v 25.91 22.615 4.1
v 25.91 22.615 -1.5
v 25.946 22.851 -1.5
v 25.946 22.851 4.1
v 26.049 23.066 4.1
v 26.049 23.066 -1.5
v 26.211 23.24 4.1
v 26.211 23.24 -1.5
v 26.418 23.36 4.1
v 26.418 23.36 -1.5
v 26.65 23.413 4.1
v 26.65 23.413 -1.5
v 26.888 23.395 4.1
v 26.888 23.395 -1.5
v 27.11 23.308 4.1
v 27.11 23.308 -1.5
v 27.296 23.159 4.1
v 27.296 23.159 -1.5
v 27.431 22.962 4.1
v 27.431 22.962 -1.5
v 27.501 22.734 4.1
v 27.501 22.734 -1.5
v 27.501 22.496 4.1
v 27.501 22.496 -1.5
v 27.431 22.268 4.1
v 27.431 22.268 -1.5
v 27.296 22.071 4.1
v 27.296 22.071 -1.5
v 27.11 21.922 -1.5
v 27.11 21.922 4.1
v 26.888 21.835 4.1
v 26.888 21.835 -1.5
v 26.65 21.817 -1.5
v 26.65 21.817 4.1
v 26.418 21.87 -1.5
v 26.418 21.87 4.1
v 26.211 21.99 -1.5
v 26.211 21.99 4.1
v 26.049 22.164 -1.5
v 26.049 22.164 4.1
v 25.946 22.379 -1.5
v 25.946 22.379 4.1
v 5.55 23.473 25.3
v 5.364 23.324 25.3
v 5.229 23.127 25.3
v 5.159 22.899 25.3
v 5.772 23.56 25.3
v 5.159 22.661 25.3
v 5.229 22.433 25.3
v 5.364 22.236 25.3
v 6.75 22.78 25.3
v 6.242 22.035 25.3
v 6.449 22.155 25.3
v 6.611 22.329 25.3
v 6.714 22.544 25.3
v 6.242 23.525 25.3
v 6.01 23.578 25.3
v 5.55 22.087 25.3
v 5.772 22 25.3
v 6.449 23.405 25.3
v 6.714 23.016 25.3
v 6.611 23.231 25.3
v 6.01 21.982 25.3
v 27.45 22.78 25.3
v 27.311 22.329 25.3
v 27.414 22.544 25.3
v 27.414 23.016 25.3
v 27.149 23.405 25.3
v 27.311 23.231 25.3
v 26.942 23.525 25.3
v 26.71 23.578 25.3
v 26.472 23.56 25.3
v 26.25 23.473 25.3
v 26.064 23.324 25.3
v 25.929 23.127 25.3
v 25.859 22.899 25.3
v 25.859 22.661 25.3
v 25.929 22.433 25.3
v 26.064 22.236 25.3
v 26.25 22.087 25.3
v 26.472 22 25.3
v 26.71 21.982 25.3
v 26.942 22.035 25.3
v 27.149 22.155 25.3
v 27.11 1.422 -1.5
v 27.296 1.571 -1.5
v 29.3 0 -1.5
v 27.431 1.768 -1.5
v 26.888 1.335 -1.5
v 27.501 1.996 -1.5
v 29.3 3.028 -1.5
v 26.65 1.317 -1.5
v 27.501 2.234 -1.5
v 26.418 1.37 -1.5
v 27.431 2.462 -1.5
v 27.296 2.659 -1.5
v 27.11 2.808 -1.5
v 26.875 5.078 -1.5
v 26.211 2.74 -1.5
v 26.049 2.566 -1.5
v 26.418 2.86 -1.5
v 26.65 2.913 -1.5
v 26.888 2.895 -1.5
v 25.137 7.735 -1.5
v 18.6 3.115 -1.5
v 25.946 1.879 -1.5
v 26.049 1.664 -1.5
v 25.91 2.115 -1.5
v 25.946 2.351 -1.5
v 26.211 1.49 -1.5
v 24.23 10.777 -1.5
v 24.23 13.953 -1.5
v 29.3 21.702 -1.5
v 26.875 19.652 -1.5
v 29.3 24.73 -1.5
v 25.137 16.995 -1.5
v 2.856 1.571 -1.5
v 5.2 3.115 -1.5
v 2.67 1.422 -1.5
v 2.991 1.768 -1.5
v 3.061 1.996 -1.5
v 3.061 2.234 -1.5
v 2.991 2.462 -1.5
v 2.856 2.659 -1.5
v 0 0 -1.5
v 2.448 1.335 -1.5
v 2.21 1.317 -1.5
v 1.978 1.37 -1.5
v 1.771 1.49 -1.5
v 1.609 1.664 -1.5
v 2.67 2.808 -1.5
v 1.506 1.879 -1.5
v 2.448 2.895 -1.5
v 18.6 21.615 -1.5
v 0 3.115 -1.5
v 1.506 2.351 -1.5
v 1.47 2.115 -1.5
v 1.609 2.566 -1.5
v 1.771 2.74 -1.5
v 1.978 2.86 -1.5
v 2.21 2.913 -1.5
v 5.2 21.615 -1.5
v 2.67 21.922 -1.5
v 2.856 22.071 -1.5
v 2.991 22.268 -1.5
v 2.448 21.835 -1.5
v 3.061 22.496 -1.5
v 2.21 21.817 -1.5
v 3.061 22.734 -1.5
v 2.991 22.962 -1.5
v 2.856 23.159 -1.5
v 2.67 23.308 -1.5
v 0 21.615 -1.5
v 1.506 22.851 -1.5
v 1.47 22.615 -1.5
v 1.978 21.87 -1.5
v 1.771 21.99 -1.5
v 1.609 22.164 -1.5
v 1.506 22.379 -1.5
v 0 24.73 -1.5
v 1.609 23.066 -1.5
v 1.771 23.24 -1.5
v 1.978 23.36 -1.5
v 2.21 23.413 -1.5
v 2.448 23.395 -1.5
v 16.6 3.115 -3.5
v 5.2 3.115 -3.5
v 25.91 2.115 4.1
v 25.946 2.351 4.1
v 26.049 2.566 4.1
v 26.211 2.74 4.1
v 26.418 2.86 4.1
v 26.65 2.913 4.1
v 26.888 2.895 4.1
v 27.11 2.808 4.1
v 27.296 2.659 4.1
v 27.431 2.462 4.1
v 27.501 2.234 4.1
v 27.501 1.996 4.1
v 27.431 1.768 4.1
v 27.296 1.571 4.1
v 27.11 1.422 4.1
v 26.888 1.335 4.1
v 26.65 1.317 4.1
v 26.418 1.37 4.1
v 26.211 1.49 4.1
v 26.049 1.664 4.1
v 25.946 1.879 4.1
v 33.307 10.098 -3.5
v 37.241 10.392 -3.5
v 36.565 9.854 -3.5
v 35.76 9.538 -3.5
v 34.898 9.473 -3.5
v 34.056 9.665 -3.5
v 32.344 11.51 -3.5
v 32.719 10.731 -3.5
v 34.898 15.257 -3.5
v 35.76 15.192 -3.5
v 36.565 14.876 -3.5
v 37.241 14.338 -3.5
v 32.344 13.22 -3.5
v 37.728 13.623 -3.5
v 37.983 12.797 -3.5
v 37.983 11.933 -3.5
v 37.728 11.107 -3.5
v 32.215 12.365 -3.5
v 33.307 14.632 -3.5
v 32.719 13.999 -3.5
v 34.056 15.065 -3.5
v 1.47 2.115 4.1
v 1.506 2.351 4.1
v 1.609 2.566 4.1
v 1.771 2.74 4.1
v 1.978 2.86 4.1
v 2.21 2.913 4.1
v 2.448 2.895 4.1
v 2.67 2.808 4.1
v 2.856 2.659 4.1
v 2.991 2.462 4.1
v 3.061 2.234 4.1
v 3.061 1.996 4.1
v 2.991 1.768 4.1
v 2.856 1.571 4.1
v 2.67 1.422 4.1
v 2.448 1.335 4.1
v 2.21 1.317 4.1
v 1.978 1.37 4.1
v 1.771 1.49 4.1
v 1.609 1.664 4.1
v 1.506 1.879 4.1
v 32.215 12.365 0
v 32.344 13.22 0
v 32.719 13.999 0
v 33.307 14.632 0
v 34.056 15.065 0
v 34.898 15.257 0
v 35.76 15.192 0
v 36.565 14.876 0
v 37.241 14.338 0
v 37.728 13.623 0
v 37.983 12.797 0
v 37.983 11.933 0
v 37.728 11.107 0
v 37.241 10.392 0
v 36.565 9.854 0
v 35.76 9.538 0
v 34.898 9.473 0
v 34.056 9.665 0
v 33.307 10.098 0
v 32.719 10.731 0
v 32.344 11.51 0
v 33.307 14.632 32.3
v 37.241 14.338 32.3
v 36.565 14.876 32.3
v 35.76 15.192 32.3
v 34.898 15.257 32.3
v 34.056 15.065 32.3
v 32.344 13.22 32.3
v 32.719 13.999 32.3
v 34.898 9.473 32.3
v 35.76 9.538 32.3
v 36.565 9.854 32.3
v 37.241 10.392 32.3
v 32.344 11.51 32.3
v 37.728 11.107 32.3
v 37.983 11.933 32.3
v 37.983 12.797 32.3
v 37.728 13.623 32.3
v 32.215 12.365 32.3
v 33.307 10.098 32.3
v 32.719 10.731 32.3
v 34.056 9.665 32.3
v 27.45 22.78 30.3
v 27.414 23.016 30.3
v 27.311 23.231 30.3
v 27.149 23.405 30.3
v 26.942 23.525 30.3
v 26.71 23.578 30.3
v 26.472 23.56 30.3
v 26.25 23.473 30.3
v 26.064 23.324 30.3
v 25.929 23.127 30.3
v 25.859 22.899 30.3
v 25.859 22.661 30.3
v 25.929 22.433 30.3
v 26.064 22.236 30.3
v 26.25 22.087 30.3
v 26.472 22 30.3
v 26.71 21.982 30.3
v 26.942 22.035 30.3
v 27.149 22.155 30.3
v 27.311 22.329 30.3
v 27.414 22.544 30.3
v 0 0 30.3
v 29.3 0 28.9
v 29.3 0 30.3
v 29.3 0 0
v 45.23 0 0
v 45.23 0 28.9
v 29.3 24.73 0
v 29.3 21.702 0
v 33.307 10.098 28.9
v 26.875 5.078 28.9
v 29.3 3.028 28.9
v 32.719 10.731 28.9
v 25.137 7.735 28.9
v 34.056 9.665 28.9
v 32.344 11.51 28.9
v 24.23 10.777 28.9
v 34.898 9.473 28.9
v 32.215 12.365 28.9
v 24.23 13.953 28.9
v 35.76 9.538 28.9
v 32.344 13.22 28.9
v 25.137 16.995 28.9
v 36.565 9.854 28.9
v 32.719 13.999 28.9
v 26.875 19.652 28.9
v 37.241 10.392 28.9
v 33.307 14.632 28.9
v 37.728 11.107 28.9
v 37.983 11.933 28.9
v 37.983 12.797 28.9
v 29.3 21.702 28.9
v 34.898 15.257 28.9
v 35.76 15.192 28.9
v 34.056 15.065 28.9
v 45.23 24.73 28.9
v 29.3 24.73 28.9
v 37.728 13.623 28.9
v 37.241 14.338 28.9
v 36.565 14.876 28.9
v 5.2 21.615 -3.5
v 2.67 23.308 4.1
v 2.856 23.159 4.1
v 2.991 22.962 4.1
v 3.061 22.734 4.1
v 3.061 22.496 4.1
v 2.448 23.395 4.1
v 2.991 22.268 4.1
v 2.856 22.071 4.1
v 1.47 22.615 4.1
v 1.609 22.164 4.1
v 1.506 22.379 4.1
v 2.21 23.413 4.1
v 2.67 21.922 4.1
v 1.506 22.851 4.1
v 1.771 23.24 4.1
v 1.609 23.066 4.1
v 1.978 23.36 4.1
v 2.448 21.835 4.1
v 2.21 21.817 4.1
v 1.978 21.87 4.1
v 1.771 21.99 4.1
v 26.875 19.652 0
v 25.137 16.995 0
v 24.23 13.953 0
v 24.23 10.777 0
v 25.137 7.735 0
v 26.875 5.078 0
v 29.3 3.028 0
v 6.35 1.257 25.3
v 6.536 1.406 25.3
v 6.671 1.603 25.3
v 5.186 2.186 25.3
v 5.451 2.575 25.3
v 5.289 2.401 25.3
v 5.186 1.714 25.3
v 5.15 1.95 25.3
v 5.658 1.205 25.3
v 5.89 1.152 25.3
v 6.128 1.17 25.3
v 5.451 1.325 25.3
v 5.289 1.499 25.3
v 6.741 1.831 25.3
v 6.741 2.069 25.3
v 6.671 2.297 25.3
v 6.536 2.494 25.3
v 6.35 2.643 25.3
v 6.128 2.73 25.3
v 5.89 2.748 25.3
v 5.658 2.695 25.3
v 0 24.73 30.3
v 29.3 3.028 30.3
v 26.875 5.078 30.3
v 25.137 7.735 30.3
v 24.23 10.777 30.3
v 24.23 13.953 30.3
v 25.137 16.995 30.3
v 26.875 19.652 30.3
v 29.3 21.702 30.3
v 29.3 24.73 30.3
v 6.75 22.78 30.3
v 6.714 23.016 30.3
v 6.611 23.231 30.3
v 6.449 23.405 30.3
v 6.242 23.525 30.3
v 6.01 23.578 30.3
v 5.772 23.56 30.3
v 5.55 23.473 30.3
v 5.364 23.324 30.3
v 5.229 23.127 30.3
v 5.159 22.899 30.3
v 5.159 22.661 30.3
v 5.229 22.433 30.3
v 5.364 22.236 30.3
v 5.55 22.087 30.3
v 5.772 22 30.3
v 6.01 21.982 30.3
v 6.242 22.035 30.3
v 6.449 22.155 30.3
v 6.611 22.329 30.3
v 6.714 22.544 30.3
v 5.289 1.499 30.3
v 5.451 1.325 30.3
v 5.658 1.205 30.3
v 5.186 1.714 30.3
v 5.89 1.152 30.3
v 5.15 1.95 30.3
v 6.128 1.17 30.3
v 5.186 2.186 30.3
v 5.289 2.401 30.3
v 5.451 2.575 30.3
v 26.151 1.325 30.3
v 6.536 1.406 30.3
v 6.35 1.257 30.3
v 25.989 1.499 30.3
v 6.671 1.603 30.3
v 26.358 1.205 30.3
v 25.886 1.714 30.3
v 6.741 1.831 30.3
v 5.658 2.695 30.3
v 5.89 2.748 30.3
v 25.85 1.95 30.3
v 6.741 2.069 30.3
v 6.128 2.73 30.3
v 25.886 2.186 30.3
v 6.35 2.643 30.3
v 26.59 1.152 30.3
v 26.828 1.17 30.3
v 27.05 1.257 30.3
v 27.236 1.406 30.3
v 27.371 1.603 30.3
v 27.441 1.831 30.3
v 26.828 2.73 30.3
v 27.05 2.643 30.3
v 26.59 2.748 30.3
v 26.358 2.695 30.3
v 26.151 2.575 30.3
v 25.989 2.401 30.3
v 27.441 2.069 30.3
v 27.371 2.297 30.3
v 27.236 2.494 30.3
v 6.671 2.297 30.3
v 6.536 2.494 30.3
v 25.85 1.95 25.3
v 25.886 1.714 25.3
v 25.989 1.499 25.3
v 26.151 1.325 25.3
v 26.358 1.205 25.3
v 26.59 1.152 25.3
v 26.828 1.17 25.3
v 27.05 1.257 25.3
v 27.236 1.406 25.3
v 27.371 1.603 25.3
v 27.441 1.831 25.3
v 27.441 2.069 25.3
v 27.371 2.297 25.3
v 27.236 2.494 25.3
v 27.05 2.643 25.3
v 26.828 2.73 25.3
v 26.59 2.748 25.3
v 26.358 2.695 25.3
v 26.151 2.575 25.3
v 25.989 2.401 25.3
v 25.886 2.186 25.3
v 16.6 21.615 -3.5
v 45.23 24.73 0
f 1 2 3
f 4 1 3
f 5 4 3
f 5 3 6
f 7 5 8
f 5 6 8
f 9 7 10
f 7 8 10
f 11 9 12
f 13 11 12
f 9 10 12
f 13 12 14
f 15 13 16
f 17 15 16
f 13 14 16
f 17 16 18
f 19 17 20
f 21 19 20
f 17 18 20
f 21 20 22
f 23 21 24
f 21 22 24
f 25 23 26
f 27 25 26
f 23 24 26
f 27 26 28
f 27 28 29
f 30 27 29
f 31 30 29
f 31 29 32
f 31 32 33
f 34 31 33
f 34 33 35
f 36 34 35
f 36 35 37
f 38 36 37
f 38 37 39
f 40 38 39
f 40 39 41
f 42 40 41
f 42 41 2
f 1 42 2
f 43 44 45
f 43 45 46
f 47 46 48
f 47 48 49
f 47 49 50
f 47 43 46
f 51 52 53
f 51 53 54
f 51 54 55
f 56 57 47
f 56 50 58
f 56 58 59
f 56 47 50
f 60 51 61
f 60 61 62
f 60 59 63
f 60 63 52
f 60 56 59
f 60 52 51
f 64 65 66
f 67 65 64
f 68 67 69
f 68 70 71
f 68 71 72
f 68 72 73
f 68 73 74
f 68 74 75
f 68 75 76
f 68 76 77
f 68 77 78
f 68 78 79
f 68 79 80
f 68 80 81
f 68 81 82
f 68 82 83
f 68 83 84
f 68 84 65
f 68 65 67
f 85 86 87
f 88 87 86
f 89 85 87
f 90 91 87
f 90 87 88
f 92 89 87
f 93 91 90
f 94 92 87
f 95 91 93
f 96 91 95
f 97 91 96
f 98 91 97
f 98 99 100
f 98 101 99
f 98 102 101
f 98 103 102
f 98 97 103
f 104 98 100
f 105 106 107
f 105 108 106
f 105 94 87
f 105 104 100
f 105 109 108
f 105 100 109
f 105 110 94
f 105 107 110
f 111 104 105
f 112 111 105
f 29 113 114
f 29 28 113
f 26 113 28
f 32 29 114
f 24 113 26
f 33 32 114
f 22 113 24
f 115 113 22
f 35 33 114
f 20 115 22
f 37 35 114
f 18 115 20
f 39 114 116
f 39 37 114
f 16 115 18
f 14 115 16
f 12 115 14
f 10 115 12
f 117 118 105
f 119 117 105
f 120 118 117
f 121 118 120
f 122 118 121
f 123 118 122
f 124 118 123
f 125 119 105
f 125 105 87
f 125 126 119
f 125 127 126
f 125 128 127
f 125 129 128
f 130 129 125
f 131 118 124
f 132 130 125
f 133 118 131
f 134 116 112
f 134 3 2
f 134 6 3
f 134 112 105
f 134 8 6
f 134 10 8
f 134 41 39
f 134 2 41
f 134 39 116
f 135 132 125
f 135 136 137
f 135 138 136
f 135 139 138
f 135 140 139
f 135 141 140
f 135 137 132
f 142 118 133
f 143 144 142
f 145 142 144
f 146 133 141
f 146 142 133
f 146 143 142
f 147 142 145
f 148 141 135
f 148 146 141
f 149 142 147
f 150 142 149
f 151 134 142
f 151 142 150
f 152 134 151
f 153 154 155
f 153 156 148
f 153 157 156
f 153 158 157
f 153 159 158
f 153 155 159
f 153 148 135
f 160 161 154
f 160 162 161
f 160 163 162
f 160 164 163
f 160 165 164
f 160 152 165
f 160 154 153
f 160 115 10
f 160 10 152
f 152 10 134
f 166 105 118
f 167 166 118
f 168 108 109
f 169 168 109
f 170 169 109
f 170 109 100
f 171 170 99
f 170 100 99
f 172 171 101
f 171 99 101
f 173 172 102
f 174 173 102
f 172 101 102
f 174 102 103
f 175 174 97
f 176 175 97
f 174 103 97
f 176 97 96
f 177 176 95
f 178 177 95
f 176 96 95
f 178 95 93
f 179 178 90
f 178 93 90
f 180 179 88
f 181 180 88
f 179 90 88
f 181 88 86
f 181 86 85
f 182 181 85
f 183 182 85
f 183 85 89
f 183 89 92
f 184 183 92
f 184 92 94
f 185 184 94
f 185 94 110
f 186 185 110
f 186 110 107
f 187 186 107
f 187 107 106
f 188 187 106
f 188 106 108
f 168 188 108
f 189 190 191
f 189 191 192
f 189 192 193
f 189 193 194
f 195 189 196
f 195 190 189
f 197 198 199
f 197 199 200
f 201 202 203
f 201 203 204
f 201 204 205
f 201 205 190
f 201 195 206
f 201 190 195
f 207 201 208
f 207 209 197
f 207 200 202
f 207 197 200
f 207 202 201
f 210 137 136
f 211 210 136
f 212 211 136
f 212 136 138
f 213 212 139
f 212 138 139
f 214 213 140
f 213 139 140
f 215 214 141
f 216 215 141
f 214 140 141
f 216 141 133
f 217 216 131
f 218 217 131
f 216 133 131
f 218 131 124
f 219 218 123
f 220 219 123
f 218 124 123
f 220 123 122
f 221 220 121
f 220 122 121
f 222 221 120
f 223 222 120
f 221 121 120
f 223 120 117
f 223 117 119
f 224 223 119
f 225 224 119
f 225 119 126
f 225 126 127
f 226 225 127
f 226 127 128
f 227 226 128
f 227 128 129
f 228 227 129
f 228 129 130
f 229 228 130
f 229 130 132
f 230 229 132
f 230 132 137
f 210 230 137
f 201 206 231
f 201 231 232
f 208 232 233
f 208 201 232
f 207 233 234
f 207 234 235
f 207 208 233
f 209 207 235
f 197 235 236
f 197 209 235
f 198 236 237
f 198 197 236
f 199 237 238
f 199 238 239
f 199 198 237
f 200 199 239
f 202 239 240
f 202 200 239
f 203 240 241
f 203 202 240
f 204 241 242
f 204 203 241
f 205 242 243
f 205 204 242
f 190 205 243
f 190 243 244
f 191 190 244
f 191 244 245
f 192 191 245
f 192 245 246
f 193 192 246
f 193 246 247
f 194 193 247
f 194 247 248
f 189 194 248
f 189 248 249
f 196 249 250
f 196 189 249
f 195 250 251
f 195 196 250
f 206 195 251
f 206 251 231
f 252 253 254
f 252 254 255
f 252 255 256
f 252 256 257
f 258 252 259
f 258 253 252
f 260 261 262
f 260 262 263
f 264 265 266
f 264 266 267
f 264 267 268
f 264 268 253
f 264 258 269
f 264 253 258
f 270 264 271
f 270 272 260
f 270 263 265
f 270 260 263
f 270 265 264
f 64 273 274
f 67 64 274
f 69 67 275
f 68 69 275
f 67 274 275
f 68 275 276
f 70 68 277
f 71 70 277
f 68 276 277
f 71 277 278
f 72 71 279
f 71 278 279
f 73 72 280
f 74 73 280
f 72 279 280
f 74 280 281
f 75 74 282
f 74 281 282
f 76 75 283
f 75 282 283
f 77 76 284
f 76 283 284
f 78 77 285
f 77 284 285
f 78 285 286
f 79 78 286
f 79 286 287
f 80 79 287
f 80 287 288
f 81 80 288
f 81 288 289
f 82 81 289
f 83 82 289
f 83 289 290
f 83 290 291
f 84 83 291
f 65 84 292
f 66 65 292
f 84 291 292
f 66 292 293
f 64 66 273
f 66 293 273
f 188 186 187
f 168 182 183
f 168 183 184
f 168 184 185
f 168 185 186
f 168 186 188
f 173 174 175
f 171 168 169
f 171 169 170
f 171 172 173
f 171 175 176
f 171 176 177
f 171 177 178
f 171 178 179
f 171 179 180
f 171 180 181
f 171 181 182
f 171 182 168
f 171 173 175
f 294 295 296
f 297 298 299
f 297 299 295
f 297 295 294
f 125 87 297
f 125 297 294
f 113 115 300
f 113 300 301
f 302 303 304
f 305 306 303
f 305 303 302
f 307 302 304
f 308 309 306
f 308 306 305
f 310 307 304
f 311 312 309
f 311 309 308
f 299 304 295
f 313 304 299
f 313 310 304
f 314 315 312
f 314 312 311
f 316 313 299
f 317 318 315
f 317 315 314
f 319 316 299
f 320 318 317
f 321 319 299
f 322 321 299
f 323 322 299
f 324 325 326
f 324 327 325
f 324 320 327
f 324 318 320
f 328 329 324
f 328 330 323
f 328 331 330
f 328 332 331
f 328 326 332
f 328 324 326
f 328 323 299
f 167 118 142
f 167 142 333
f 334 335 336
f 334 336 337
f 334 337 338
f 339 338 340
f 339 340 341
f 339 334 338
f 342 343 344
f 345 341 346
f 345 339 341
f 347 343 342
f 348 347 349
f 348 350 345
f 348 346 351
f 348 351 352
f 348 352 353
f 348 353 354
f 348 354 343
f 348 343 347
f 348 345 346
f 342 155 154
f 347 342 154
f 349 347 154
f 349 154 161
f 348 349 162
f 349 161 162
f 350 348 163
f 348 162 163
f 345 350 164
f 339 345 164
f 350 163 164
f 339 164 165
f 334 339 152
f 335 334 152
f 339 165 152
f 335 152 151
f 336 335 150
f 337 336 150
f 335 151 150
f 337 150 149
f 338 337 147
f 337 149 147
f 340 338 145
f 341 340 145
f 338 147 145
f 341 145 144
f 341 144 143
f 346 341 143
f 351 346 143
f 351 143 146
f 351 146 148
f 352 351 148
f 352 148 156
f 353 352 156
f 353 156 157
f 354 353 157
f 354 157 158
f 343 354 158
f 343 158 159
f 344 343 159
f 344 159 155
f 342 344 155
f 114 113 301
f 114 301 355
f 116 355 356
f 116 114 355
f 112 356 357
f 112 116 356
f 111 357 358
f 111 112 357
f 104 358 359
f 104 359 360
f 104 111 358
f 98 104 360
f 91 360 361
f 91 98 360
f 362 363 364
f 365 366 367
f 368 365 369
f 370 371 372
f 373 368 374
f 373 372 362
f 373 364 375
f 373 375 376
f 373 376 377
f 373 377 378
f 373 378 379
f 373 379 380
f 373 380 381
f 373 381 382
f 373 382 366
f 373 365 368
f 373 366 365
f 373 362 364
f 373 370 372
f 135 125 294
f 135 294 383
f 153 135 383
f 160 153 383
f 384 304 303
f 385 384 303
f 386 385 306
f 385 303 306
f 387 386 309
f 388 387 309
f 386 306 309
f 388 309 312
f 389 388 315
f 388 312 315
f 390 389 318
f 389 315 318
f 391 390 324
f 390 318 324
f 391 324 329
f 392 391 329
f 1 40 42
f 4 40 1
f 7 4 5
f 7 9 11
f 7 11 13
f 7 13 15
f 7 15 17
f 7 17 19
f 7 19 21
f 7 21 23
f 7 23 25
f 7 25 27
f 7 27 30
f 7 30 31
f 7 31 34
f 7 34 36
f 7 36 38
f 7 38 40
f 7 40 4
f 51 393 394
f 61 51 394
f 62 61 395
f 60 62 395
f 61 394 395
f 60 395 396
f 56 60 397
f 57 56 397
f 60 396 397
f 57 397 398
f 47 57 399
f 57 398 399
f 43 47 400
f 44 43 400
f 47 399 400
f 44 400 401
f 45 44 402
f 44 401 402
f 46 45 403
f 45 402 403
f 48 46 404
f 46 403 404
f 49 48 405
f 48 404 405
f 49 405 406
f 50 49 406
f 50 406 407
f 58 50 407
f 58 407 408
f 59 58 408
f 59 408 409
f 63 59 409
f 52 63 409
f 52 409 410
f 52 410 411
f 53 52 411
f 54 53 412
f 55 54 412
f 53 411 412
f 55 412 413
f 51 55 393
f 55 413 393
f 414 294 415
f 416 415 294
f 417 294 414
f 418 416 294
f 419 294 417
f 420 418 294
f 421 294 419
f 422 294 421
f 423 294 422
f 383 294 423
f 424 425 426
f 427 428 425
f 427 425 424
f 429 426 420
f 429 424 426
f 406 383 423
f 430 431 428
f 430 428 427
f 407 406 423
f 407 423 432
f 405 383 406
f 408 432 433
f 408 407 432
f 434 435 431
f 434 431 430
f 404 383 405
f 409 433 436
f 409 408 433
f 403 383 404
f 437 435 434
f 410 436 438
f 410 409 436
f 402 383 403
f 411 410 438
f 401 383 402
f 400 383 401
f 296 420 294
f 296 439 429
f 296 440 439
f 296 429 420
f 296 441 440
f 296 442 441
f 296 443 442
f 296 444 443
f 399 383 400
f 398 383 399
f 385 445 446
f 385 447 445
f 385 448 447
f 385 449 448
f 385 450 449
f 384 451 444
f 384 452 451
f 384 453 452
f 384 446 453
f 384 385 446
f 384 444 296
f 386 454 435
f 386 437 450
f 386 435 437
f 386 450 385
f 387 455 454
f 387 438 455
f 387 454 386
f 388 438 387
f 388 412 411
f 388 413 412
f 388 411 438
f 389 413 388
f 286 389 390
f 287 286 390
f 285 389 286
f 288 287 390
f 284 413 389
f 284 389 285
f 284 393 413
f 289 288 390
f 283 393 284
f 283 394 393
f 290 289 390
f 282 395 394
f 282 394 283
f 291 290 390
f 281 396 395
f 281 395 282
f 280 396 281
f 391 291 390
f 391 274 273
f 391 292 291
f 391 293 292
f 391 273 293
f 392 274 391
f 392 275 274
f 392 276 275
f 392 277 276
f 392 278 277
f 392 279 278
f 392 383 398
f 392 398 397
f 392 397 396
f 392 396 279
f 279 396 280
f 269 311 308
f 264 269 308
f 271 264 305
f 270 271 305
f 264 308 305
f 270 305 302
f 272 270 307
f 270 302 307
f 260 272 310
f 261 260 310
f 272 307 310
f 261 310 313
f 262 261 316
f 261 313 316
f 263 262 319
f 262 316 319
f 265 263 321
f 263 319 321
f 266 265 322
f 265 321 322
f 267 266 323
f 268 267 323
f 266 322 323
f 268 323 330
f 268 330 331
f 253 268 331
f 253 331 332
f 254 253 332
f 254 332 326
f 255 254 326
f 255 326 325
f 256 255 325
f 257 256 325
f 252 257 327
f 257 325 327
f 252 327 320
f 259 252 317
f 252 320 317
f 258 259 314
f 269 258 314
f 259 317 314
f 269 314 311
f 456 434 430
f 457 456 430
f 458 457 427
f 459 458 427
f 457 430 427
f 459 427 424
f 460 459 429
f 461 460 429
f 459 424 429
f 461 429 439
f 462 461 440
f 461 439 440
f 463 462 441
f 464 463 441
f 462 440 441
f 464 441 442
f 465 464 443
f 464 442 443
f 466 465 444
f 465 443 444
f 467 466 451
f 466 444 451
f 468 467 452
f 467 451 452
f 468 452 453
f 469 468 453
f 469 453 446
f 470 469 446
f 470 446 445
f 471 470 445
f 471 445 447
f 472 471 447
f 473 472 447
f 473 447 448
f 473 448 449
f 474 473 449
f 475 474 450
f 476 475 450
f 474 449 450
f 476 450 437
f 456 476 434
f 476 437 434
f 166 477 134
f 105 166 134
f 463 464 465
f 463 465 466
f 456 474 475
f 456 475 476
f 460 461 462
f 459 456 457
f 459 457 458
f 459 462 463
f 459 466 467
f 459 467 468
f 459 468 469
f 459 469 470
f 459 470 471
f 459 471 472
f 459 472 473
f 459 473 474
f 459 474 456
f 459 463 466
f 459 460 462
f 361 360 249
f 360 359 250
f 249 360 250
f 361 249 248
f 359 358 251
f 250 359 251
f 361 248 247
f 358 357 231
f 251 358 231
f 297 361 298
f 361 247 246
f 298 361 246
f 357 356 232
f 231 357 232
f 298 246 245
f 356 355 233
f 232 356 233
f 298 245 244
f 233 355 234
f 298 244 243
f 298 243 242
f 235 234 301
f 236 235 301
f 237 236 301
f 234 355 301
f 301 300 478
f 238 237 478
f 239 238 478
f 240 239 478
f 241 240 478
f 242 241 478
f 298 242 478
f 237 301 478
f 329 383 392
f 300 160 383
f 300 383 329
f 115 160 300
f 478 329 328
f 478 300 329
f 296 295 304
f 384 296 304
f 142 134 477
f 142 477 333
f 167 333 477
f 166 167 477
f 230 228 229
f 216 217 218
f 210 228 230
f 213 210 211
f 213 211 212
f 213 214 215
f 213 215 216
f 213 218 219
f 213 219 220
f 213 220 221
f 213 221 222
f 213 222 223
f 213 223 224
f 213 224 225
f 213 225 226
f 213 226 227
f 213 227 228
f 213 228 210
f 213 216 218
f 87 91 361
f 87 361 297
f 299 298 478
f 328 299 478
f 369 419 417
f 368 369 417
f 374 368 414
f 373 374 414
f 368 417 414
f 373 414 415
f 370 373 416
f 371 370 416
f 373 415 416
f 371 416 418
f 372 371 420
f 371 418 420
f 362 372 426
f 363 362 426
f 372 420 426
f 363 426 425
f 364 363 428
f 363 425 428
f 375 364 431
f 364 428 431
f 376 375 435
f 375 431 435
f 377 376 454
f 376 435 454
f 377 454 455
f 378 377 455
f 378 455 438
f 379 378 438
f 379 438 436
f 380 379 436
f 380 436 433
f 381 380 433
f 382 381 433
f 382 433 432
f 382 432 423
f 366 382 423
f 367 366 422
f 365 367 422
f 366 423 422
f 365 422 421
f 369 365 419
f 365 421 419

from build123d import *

# Parameters (mm, degrees)
SKETCH_1_W            = 45.23
SKETCH_1_H            = 24.73
EXTRUDE_1_DEPTH       = 28.9
SKETCH_2_R            = 2.9
EXTRUDE_2_DEPTH       = 3.4
EXTRUDE_3_DEPTH       = 1.4
SKETCH_4_R            = 0.8
CUT_EXTRUDE_1_DEPTH   = 5
SKETCH_6_R            = 0.8
CUT_EXTRUDE_2_DEPTH   = 4.1
EXTRUDE_START         = 1.5
SKETCH_7_R            = 0.8
EXTRUDE_5_DEPTH       = 1.5
EXTRUDE_6_DEPTH       = 24.73
EXTRUDE_START_2       = 3.5
SKETCH_5_R            = 2.9
EXTRUDE_4_DEPTH       = 3.5
SKETCH_11_W           = 39.736399629
SKETCH_11_H           = 38.5
SKETCH_11_W_2         = 19.736399629
SKETCH_11_H_2         = 18.5
CUT_EXTRUDE_1_2_DEPTH = 62.642240388


with BuildPart() as part:
    # 草图1 → 凸台-拉伸1 (new body)
    with BuildSketch(Plane.XY):
        with Locations((22.615, 12.365)):
            Rectangle(SKETCH_1_W, SKETCH_1_H)
    extrude(amount=EXTRUDE_1_DEPTH)

    # 草图2 → 凸台-拉伸2 (add)
    with BuildSketch(Plane.XY.offset(28.9)):
        with Locations(Location((35.115, 12.365, 0), (0, 0, 180))):
            Circle(SKETCH_2_R)
    extrude(amount=EXTRUDE_2_DEPTH)

    # 草图3 → 凸台-拉伸3 (add)
    with BuildSketch(Plane.XY.offset(28.9)):
        with BuildLine():
            Line((29.3, 21.702332328), (29.3, 24.73))
            Line((29.3, 24.73), (0, 24.73))
            Line((0, 24.73), (0, 0))
            Line((0, 0), (29.3, 0))
            Line((29.3, 0), (29.3, 3.027667672))
            ThreePointArc((29.3, 3.027667672), (24.115, 12.365), (29.3, 21.702332328))
        make_face()
    extrude(amount=EXTRUDE_3_DEPTH)

    # 草图4 → Cut-Extrude 1 (cut)
    with BuildSketch(Plane.XY.offset(30.3)):
        with Locations((5.95, 22.78)):
            Circle(SKETCH_4_R)
        with Locations((26.65, 22.78)):
            Circle(SKETCH_4_R)
        with Locations(Location((26.65, 1.95, 0), (0, 0, 180))):
            Circle(SKETCH_4_R)
        with Locations(Location((5.95, 1.95, 0), (0, 0, 180))):
            Circle(SKETCH_4_R)
    extrude(amount=-CUT_EXTRUDE_1_DEPTH, mode=Mode.SUBTRACT)

    # 草图6 → 切除-拉伸2 (cut)
    with BuildSketch(Plane(origin=(0, 0, 0), x_dir=(-1, 0, 0), z_dir=(0, 0, -1))):
        with Locations((-26.71, 22.615)):
            Circle(SKETCH_6_R)
        with Locations((-2.27, 22.615)):
            Circle(SKETCH_6_R)
        with Locations((-2.27, 2.115)):
            Circle(SKETCH_6_R)
        with Locations((-26.71, 2.115)):
            Circle(SKETCH_6_R)
    extrude(amount=-CUT_EXTRUDE_2_DEPTH, mode=Mode.SUBTRACT)

    # 草图7 → 凸台-拉伸5 (add)
    with BuildSketch(Plane(origin=(0, 0, 0), x_dir=(-1, 0, 0), z_dir=(0, 0, -1)).offset(EXTRUDE_START)):
        with BuildLine():
            Line((0, 24.73), (-29.3, 24.73))
            Line((-29.3, 24.73), (-29.3, 21.702332328))
            ThreePointArc((-29.3, 21.702332328), (-24.115, 12.365), (-29.3, 3.027667672))
            Line((-29.3, 3.027667672), (-29.3, 0))
            Line((-29.3, 0), (0, 0))
            Line((0, 0), (0, 24.73))
        make_face()
        with Locations((-26.71, 2.115)):
            Circle(SKETCH_7_R, mode=Mode.SUBTRACT)
        with Locations((-2.27, 2.115)):
            Circle(SKETCH_7_R, mode=Mode.SUBTRACT)
        with Locations((-26.71, 22.615)):
            Circle(SKETCH_7_R, mode=Mode.SUBTRACT)
        with Locations((-2.27, 22.615)):
            Circle(SKETCH_7_R, mode=Mode.SUBTRACT)
    extrude(amount=-EXTRUDE_5_DEPTH)

    # 草图10 → 凸台-拉伸6 (add, through all)
    with BuildSketch(Plane(origin=(0, 0, 0), x_dir=(1, 0, 0), z_dir=(0, 1, 0))):
        Polygon((5.2, 1.5), (5.2, 3.5), (16.6, 3.5), (18.6, 1.5), align=None)
    extrude(amount=EXTRUDE_6_DEPTH)

    # 草图5 → 凸台-拉伸4 (add)
    with BuildSketch(Plane(origin=(0, 0, 0), x_dir=(-1, 0, 0), z_dir=(0, 0, -1)).offset(EXTRUDE_START_2)):
        with Locations((-35.115, 12.365)):
            Circle(SKETCH_5_R)
    extrude(amount=-EXTRUDE_4_DEPTH)

    # 草图11 → Cut-Extrude 1 2 (cut, through all)
    with BuildSketch(Plane(origin=(0, 0, -1.5), x_dir=(-1, 0, 0), z_dir=(0, 0, -1))):
        with Locations((-9.868199815, 12.365)):
            Rectangle(SKETCH_11_W, SKETCH_11_H)
        with Locations((-9.868199815, 12.365)):
            Rectangle(SKETCH_11_W_2, SKETCH_11_H_2, mode=Mode.SUBTRACT)
    extrude(amount=CUT_EXTRUDE_1_2_DEPTH, mode=Mode.SUBTRACT)


solid = part.part
